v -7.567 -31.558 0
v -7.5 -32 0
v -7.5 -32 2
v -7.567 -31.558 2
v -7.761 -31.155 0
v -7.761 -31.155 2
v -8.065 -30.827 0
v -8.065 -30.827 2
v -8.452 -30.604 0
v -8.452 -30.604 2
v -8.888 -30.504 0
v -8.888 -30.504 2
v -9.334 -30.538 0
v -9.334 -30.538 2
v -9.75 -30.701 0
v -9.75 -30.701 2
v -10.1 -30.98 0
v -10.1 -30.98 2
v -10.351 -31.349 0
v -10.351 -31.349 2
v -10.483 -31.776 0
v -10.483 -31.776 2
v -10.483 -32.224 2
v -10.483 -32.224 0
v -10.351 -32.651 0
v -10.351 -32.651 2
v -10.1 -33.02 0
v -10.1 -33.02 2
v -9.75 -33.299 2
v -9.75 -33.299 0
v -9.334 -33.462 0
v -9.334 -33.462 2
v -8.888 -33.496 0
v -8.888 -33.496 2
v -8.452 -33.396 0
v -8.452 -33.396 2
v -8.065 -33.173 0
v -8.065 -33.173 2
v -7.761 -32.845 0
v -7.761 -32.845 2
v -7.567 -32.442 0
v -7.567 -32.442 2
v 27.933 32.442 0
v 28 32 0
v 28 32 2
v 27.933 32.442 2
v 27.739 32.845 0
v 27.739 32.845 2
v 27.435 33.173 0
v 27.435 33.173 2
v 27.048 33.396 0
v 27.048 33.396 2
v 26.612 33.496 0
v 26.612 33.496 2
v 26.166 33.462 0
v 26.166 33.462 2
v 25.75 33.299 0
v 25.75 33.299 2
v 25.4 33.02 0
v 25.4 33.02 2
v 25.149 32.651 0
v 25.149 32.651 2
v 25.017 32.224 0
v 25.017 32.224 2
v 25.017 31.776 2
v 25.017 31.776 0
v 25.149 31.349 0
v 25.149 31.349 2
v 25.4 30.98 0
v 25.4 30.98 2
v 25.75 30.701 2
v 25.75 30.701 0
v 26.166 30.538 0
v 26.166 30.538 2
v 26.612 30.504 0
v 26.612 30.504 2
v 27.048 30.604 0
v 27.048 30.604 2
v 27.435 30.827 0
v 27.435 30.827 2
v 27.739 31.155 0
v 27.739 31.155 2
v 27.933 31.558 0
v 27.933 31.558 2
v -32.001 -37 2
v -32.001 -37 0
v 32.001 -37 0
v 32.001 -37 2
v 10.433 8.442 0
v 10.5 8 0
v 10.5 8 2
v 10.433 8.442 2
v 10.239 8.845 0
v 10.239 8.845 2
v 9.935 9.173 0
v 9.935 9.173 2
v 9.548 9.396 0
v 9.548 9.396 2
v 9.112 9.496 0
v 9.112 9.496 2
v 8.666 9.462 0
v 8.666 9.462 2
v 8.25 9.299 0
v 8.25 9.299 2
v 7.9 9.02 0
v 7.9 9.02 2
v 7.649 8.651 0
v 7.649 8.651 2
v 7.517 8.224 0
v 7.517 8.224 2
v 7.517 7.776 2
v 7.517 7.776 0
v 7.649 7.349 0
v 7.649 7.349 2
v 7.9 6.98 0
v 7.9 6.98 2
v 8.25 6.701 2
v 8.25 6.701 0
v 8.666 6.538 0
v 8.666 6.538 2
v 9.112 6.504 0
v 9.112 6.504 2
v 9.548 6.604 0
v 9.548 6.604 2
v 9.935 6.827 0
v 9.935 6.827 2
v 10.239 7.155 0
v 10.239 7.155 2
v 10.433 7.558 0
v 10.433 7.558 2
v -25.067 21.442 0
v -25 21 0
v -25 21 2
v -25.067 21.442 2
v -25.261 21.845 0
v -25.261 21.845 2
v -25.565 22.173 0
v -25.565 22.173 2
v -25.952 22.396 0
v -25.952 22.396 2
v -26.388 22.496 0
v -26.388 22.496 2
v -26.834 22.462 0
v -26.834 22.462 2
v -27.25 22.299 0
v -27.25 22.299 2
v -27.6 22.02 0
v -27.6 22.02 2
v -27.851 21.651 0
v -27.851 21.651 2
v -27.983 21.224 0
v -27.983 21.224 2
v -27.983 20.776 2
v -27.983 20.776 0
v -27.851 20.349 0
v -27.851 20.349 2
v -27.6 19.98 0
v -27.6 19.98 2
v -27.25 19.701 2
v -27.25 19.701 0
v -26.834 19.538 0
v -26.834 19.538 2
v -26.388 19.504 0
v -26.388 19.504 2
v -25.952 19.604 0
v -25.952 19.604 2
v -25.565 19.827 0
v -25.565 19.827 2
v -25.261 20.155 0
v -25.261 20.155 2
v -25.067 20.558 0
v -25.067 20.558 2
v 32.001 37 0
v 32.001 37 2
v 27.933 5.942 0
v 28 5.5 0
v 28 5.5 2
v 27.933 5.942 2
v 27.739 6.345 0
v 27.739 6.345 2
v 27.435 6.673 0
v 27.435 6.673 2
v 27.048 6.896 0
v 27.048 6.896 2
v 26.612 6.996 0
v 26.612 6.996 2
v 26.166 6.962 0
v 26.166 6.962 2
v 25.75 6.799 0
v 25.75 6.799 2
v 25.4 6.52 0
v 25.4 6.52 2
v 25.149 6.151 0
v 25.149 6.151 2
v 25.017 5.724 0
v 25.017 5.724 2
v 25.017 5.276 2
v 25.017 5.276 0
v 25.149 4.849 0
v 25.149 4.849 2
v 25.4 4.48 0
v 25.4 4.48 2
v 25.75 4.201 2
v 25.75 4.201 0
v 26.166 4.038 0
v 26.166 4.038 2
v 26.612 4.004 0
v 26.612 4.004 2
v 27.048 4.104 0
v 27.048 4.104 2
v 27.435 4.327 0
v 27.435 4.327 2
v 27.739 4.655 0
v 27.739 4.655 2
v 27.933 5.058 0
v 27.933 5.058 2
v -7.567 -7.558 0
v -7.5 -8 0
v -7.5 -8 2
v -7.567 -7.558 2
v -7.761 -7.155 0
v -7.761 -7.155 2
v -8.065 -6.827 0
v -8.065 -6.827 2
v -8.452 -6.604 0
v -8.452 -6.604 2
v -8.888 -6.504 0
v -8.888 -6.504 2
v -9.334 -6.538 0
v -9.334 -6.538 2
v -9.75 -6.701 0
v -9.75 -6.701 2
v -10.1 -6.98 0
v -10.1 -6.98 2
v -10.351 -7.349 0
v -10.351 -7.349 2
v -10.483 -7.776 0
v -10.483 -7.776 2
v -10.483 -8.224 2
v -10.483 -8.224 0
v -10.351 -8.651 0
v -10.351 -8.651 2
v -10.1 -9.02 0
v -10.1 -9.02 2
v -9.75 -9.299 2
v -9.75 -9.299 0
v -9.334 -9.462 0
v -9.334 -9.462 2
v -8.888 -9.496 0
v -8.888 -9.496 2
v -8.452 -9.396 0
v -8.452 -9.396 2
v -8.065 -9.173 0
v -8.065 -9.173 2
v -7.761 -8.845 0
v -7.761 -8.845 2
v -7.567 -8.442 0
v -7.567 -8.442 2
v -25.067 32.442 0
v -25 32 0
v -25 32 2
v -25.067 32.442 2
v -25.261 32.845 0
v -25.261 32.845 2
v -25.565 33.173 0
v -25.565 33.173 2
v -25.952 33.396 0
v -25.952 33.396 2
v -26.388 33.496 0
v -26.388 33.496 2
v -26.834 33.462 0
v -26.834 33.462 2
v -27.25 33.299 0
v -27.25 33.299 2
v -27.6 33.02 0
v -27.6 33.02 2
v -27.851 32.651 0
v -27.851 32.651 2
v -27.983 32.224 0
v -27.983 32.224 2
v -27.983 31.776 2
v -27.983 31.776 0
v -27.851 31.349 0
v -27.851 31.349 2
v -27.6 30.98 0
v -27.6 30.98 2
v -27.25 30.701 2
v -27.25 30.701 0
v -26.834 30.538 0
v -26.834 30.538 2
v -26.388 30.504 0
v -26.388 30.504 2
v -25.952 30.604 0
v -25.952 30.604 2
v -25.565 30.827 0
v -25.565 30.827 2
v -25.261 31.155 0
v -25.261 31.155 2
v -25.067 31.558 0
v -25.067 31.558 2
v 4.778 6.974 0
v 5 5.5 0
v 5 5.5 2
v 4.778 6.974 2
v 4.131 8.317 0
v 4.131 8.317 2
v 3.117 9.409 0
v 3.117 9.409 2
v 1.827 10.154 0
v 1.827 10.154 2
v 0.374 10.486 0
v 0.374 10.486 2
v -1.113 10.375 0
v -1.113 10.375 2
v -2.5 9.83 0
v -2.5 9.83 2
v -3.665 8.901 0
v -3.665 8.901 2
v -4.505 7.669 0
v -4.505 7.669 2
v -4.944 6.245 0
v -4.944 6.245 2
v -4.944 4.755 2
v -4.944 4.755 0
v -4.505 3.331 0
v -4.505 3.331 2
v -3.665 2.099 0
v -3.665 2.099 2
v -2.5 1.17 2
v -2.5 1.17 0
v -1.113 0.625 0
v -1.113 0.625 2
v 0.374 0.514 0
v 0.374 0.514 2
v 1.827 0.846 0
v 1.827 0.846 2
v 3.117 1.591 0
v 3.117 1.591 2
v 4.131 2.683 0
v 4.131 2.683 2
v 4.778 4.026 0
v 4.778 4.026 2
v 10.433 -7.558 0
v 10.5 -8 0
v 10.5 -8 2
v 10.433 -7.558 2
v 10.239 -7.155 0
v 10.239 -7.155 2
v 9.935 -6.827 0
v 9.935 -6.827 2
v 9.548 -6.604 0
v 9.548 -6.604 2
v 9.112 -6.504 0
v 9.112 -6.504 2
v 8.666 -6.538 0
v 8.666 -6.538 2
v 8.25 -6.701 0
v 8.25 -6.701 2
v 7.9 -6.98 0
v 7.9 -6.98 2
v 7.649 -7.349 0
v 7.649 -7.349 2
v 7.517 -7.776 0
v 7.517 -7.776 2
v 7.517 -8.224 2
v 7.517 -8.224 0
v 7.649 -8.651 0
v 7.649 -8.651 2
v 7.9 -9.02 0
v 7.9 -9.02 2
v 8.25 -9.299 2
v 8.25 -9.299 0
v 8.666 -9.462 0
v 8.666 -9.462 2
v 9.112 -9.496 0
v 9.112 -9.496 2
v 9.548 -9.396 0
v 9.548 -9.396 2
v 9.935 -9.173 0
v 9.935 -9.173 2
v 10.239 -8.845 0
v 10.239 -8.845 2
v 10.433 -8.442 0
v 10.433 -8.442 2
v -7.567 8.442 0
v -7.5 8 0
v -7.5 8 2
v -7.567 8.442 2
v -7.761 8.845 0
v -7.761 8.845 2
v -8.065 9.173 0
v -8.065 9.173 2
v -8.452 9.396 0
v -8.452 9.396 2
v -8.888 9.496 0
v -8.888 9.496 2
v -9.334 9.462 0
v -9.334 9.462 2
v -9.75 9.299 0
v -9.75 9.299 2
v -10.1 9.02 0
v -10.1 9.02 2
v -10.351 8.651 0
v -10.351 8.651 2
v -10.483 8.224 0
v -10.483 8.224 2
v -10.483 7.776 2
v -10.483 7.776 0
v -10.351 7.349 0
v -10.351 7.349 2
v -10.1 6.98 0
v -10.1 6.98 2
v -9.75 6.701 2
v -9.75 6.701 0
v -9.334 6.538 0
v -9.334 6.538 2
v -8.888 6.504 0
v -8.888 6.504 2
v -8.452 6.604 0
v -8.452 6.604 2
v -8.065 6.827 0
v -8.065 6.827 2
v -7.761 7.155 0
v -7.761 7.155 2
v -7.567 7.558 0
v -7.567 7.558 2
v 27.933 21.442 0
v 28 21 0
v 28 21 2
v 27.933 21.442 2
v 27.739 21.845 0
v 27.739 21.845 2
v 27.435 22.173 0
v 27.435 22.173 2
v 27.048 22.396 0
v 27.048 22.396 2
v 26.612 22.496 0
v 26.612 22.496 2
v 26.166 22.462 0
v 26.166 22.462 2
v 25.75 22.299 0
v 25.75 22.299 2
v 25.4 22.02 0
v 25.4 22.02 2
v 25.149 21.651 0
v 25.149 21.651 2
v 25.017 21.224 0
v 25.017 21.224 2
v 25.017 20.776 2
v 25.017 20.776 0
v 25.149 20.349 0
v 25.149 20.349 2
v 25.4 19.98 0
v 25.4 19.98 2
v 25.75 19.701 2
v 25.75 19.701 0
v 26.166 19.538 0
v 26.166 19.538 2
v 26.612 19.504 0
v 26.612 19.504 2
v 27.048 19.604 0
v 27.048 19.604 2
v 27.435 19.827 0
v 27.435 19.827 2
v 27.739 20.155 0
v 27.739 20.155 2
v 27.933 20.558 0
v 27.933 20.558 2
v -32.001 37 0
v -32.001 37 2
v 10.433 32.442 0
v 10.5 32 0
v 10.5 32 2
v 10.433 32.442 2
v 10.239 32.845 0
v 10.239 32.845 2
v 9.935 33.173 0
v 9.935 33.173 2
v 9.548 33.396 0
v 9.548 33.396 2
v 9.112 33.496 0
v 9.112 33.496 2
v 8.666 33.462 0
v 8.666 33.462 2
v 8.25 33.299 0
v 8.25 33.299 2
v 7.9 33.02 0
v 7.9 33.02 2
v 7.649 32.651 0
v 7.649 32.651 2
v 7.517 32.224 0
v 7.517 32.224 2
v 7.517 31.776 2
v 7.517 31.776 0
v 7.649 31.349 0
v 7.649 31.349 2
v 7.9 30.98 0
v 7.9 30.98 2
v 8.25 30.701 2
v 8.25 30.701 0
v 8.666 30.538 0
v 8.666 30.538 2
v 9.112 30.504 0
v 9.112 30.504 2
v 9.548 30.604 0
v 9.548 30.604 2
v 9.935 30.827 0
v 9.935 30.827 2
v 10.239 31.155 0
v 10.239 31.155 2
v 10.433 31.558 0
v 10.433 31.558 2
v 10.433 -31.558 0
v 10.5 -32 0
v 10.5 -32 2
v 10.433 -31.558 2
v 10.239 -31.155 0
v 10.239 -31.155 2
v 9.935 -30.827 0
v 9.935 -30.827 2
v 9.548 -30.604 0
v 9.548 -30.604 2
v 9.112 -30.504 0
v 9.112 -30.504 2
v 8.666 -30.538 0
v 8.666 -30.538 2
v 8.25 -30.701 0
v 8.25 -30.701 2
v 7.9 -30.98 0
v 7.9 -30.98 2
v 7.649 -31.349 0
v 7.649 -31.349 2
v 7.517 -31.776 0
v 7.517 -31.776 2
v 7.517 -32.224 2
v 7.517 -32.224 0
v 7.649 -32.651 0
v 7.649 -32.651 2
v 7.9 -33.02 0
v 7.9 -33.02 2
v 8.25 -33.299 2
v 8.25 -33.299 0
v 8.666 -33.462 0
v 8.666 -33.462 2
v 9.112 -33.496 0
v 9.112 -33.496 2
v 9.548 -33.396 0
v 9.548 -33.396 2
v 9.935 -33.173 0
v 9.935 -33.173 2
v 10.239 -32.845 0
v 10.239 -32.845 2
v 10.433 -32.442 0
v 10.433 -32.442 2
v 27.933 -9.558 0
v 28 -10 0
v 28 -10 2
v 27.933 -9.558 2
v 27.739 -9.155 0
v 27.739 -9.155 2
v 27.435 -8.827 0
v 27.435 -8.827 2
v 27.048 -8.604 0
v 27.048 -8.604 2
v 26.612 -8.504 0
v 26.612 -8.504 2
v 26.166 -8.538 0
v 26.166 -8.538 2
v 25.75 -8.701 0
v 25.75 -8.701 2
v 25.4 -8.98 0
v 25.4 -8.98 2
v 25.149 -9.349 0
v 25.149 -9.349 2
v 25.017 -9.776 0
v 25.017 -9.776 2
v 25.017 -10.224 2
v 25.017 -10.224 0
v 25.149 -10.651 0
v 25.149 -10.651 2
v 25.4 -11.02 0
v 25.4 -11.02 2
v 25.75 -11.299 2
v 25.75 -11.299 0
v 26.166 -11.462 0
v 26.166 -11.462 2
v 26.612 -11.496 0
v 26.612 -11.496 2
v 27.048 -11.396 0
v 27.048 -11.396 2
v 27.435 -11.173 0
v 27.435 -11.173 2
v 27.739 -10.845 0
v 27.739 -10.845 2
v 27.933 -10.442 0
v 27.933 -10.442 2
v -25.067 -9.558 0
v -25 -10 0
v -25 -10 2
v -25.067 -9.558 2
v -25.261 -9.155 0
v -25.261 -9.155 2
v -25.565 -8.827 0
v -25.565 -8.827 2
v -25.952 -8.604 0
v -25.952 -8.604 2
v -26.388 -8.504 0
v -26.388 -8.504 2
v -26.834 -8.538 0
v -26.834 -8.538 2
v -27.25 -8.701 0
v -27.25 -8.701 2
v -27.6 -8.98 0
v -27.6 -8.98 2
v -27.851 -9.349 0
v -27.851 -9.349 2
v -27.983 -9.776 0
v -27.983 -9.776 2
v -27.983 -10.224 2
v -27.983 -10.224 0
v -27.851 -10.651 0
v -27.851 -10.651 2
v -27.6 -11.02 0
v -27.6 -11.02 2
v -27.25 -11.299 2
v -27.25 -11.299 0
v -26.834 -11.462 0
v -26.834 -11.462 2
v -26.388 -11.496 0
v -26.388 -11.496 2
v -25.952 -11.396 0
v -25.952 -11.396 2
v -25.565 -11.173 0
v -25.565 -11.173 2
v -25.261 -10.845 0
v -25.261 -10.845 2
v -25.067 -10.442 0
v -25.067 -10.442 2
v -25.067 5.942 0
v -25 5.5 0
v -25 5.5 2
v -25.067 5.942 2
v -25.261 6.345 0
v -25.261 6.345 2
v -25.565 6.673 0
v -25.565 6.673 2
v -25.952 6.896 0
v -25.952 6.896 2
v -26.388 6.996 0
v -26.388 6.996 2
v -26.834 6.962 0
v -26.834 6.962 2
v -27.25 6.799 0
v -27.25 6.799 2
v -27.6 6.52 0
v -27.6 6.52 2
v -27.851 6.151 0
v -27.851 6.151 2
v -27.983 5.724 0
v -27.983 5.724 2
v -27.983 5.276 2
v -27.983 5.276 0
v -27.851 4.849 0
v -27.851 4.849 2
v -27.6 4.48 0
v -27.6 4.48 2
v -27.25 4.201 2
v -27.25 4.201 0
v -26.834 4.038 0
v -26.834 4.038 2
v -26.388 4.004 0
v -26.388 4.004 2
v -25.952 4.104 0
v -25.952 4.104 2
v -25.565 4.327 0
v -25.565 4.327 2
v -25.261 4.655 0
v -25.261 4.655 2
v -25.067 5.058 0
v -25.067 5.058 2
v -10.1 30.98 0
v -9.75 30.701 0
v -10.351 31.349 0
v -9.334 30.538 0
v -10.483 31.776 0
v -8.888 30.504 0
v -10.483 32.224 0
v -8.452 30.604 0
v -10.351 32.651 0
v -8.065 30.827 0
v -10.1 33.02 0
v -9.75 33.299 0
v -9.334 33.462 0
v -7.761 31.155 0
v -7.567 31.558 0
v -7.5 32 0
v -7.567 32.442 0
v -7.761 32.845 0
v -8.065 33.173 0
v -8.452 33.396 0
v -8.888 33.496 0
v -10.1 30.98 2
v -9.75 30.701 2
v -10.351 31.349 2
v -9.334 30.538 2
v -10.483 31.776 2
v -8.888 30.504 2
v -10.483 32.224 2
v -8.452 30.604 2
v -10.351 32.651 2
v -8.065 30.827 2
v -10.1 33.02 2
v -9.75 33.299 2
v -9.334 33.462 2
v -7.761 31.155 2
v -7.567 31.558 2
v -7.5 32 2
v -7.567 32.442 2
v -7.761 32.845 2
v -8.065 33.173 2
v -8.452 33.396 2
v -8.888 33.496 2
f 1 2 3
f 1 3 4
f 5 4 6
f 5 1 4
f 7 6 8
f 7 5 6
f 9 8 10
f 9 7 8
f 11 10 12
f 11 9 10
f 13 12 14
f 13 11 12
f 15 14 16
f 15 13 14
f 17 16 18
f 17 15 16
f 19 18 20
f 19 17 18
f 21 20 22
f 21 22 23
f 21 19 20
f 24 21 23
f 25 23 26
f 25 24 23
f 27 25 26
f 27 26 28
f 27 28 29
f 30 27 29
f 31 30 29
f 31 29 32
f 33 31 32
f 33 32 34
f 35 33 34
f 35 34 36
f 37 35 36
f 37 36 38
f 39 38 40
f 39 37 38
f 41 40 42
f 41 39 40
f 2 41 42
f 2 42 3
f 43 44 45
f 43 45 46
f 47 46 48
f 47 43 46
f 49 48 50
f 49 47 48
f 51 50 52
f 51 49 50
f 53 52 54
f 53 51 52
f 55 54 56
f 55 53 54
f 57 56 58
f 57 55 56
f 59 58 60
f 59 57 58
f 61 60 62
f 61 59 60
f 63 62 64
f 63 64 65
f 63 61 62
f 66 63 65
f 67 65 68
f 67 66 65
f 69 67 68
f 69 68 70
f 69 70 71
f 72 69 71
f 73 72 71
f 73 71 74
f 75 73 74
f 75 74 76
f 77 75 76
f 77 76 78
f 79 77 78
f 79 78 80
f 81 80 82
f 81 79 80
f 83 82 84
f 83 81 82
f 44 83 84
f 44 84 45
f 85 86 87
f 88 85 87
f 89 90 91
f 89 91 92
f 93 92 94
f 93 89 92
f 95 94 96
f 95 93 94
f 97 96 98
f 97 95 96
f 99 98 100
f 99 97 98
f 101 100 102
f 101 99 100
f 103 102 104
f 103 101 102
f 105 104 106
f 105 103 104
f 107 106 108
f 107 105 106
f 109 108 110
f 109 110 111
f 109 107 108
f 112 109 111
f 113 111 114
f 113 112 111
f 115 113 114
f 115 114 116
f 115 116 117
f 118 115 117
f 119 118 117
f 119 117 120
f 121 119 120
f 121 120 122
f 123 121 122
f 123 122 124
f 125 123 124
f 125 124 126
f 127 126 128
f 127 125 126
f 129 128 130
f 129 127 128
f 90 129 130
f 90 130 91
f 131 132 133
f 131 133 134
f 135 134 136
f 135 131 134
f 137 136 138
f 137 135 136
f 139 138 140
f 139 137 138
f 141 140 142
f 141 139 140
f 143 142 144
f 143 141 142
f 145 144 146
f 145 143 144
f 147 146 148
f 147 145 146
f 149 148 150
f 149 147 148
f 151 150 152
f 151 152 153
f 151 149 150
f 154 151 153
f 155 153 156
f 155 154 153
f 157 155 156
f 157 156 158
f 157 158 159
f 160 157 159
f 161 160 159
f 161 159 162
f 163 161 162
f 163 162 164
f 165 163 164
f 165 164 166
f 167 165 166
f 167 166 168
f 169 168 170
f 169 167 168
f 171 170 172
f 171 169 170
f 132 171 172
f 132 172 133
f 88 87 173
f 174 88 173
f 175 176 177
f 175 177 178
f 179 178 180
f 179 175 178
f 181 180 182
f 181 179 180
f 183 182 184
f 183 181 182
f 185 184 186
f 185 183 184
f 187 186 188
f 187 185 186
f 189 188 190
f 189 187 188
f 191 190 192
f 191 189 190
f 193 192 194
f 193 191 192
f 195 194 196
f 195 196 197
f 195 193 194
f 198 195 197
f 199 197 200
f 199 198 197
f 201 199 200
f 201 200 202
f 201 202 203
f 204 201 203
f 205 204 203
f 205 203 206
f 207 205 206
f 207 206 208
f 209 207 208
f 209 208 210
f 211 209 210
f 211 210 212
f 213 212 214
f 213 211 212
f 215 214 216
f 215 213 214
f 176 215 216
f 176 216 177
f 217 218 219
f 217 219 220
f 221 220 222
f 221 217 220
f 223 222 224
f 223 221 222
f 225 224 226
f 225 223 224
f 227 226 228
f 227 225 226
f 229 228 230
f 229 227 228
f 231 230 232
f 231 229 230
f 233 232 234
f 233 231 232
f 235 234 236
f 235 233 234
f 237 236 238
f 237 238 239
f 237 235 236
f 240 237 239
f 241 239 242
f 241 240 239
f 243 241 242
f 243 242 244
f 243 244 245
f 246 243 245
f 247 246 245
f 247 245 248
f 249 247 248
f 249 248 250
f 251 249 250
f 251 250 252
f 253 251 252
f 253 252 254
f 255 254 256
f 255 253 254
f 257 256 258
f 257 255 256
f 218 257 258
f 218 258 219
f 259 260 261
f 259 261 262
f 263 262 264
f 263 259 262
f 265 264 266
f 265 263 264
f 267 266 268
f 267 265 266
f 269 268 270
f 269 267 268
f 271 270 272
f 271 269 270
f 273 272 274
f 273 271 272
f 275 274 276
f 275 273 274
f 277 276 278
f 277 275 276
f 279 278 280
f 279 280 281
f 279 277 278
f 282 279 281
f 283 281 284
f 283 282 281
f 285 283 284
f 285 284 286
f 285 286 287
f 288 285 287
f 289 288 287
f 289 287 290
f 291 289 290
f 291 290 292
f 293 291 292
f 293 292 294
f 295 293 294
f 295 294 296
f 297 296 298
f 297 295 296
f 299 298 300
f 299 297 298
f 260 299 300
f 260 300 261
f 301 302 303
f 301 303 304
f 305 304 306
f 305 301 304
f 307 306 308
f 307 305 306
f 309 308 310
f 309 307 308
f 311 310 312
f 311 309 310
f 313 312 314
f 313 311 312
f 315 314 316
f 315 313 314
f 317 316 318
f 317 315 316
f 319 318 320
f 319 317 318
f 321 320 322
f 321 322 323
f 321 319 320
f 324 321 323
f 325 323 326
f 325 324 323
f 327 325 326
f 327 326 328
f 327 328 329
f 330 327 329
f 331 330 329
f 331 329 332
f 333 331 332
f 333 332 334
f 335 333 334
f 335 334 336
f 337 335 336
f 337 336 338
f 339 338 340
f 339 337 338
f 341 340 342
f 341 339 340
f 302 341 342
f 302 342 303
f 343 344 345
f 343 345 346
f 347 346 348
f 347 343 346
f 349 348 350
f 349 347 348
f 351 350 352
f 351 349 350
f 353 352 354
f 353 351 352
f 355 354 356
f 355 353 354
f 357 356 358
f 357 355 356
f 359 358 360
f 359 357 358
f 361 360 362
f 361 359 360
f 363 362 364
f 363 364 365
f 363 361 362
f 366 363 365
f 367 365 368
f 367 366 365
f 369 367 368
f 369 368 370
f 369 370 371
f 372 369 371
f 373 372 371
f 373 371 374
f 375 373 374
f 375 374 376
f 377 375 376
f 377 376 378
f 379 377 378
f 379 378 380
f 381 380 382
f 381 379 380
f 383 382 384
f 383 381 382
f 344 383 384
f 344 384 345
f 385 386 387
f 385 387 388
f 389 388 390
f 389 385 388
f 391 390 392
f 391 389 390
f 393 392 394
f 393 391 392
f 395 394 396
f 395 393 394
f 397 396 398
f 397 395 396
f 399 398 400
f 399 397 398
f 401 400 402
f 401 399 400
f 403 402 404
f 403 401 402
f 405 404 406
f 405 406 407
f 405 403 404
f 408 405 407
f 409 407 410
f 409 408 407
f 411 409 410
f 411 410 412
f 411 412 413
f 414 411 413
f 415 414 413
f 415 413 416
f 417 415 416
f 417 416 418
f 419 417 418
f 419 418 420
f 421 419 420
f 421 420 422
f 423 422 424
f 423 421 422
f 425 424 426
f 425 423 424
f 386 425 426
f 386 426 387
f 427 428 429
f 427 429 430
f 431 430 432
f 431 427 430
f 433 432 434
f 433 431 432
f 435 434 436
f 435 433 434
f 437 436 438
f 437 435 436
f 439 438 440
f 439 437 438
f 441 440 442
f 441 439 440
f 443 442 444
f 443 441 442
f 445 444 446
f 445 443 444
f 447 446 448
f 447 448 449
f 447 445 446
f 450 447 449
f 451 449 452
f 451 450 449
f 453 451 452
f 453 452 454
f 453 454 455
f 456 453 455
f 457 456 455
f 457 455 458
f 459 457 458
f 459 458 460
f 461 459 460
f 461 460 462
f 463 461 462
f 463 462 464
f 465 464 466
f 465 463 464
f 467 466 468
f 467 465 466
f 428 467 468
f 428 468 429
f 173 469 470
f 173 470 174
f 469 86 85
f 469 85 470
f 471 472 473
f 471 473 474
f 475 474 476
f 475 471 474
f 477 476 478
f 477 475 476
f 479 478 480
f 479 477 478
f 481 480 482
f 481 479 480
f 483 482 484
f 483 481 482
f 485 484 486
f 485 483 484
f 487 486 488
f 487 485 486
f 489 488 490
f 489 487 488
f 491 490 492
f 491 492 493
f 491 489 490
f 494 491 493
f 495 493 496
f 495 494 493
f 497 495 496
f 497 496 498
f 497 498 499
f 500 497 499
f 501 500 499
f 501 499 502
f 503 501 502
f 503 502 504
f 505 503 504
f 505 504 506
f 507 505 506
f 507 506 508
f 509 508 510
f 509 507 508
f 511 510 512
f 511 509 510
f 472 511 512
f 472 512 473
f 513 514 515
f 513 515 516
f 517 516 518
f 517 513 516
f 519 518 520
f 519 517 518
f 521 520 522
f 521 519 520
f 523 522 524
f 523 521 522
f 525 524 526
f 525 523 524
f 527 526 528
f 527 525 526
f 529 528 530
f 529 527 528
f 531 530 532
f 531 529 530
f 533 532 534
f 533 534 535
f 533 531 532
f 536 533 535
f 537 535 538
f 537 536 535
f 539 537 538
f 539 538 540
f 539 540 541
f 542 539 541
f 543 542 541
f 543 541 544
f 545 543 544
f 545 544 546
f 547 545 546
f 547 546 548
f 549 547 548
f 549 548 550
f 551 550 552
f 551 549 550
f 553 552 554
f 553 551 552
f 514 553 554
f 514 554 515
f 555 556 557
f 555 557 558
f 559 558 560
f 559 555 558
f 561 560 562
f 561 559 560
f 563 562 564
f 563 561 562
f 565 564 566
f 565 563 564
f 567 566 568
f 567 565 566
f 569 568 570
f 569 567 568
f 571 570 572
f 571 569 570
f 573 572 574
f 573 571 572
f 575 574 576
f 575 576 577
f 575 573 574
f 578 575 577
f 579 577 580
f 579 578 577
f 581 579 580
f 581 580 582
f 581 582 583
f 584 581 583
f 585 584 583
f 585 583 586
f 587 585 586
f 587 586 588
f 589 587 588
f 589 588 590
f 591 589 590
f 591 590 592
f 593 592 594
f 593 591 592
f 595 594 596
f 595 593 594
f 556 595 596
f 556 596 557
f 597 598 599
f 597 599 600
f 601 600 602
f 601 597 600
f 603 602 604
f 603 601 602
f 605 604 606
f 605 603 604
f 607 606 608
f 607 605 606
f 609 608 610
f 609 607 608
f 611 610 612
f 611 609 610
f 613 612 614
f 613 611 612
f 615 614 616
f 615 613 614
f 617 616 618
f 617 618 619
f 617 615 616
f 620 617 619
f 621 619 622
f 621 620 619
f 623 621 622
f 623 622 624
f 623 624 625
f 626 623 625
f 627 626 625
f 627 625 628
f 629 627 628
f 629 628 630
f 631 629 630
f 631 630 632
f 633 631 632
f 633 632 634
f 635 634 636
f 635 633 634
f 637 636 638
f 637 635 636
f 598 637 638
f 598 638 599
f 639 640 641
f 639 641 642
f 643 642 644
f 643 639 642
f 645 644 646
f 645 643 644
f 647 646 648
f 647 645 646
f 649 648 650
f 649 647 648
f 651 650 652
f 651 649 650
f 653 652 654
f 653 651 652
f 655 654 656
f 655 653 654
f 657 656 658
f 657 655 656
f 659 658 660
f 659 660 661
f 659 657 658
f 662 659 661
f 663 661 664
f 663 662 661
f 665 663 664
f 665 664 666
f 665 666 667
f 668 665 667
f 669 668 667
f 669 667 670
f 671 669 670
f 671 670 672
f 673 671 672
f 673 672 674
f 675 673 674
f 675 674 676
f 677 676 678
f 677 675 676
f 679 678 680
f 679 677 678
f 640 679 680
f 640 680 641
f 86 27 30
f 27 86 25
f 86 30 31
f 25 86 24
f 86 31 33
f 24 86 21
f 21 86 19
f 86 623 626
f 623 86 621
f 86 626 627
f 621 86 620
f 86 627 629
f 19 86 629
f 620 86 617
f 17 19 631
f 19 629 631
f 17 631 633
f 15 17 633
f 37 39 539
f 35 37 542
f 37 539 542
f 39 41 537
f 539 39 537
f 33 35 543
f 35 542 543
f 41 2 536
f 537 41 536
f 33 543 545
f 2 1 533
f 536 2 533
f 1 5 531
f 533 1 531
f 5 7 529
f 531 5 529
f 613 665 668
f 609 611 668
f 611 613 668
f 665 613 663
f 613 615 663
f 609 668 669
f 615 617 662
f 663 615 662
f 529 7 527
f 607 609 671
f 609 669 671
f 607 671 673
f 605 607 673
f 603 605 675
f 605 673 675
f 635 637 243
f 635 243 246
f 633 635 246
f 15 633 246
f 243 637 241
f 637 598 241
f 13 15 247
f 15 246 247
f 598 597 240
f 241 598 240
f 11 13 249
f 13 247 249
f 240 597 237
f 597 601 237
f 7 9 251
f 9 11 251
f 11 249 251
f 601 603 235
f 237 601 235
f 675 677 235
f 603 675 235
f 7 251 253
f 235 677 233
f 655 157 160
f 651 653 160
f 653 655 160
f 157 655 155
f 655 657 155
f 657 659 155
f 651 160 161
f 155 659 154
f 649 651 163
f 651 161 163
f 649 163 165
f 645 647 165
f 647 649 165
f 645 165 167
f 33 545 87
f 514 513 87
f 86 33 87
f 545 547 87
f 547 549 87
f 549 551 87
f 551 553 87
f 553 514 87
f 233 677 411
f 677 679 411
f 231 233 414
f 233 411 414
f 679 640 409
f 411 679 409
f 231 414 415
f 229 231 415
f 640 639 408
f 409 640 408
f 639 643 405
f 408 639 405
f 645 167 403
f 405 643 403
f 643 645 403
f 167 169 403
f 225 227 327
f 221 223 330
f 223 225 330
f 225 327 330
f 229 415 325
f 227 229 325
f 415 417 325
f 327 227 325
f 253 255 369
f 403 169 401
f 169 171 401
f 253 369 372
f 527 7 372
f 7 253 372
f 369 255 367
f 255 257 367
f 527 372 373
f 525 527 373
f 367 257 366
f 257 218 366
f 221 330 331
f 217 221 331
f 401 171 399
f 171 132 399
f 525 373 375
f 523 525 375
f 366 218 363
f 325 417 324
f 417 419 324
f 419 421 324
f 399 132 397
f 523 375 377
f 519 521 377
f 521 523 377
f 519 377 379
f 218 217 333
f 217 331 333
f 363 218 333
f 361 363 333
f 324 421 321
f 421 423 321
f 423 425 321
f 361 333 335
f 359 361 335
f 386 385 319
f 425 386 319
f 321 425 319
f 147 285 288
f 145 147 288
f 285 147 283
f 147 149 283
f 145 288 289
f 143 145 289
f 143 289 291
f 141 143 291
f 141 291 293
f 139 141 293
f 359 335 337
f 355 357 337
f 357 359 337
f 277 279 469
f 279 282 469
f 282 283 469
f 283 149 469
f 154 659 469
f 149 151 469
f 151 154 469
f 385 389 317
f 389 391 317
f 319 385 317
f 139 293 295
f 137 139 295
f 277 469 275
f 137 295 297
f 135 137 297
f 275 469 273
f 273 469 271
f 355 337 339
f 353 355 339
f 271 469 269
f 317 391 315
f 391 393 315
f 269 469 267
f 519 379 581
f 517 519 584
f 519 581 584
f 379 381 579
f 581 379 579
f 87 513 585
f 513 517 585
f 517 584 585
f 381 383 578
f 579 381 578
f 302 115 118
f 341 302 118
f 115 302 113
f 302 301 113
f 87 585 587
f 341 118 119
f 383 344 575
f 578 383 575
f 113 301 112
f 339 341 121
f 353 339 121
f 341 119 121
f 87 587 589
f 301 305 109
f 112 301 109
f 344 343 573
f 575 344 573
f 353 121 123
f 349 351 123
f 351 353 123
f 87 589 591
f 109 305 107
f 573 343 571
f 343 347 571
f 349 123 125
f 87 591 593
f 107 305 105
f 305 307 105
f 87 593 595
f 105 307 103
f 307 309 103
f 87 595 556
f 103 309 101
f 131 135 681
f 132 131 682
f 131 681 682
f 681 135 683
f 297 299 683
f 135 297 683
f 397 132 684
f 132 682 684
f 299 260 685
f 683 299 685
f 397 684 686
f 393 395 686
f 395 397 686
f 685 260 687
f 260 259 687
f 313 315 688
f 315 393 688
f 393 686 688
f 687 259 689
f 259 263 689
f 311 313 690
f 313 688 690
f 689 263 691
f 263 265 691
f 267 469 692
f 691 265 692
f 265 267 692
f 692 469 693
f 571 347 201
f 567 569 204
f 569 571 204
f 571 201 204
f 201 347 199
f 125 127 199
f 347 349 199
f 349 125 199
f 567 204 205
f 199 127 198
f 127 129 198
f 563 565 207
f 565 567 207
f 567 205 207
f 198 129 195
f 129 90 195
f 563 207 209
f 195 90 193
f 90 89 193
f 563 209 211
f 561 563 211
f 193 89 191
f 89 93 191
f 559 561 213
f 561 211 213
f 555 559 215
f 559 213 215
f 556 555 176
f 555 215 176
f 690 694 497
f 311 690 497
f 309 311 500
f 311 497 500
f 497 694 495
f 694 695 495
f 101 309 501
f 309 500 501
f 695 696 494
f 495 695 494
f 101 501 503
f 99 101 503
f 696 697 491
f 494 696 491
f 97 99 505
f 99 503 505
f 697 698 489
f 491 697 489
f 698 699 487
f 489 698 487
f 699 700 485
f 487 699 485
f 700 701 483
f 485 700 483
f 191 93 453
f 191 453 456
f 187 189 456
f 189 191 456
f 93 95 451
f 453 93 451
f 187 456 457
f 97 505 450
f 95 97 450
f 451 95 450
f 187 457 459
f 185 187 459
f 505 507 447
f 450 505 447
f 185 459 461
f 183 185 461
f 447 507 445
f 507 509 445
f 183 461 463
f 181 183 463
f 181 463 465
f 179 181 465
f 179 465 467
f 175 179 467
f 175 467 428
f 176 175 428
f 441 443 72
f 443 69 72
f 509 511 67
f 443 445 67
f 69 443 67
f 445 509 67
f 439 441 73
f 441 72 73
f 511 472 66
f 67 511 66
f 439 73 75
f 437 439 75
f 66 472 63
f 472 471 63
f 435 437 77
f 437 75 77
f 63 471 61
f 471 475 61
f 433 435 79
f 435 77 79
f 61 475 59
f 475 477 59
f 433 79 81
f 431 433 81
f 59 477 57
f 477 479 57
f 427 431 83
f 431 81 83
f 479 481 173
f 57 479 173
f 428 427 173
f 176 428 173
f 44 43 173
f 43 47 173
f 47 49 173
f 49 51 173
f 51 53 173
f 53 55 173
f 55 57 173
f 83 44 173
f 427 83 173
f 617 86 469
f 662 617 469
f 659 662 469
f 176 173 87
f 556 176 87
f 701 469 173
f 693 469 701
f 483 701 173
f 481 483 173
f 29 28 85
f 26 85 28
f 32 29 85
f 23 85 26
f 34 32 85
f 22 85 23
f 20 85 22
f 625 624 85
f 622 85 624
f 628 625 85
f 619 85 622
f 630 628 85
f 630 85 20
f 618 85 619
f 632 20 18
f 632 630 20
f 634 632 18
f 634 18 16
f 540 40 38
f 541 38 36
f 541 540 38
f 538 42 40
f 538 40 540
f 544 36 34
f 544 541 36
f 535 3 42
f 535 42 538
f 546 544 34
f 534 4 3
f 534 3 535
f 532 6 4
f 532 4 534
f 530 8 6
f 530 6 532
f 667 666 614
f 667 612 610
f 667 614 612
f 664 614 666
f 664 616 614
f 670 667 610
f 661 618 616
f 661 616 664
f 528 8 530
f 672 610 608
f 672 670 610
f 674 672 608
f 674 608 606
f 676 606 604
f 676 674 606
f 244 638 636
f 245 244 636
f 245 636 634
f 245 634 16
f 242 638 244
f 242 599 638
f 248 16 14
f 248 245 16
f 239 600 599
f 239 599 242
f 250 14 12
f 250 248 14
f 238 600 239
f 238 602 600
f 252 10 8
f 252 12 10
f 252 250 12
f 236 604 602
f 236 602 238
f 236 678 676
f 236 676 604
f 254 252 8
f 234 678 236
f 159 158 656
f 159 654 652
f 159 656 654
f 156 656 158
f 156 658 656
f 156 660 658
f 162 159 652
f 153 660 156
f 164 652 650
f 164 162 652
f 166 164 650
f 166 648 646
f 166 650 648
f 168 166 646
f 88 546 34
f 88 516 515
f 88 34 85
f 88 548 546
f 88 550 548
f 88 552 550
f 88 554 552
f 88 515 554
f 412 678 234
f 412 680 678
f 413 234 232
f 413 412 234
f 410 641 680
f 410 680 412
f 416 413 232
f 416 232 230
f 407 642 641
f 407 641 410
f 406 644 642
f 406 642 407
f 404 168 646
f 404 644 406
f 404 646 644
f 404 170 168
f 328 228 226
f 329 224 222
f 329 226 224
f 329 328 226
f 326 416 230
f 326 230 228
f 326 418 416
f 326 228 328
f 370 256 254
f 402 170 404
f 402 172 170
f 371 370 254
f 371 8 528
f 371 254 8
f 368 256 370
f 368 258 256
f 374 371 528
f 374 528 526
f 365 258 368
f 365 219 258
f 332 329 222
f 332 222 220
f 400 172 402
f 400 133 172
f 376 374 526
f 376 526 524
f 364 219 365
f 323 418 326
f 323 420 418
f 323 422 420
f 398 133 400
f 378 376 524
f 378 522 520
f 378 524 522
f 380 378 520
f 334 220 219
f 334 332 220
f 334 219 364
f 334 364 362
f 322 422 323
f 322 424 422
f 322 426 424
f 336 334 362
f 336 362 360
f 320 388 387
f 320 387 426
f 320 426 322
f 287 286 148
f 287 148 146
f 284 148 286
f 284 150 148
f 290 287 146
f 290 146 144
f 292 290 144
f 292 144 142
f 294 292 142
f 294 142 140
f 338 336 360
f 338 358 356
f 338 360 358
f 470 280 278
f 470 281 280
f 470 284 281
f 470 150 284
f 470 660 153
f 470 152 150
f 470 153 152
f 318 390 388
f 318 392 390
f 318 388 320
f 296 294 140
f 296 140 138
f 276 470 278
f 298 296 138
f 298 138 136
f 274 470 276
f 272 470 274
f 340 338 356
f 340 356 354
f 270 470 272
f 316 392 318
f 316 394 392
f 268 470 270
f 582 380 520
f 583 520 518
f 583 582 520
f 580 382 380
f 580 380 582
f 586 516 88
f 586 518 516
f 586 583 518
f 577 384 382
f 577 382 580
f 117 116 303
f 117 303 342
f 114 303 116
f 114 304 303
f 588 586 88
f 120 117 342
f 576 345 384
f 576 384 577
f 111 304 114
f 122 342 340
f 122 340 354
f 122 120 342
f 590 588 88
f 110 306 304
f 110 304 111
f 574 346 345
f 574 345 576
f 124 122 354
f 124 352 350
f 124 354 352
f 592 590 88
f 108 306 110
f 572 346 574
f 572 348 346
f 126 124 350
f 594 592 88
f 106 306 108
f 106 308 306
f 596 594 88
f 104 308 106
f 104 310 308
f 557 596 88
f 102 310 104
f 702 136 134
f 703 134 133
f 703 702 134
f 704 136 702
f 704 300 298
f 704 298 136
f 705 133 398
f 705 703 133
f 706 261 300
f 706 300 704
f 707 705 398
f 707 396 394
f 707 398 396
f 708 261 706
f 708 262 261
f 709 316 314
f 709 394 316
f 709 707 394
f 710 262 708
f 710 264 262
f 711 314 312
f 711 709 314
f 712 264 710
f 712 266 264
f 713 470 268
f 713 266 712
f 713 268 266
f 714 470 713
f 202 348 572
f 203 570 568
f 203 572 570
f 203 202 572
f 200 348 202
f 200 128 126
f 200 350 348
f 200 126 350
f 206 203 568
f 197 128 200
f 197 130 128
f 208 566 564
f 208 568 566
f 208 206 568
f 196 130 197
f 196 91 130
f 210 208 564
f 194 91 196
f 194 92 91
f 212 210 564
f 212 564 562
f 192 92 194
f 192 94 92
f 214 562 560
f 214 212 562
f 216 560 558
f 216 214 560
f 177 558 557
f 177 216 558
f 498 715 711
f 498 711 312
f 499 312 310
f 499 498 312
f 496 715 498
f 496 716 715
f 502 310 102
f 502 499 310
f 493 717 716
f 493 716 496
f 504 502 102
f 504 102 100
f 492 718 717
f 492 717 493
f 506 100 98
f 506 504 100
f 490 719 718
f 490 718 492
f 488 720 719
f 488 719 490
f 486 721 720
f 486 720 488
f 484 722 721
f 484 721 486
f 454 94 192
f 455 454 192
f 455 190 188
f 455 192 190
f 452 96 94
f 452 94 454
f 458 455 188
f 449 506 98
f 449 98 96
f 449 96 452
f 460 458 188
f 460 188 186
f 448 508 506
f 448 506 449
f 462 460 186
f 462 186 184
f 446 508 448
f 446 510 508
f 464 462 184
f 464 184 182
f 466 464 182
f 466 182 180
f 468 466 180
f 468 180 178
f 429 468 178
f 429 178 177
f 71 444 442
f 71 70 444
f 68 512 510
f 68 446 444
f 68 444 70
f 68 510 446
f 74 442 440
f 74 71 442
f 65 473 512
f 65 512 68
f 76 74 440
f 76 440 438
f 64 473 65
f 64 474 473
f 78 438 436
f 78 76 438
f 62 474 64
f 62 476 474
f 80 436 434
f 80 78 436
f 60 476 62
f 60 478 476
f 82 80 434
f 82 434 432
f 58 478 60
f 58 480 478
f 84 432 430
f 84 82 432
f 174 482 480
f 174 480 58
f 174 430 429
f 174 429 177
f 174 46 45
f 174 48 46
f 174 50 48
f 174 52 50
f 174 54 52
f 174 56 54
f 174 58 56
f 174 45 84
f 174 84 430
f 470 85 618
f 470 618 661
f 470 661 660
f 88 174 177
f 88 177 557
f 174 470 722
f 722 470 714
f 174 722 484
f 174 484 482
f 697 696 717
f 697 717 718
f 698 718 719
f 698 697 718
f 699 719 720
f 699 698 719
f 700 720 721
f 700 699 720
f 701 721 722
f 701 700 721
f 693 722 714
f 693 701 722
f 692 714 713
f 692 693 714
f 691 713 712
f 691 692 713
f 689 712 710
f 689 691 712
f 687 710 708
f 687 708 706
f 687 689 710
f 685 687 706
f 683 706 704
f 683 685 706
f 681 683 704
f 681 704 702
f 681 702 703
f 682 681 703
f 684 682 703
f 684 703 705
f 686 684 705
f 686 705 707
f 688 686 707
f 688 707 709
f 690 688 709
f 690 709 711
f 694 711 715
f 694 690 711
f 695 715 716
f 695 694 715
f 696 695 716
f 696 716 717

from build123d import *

# Parameters (mm, degrees)
SKETCH1_W           = 64.001099834
SKETCH1_H           = 74
SKETCH1_R           = 1.5
SKETCH1_R_2         = 5
BOSS_EXTRUDE1_DEPTH = 2


with BuildPart() as part:
    # Sketch1 → Boss-Extrude1 (new body)
    with BuildSketch(Plane.XY):
        Rectangle(SKETCH1_W, SKETCH1_H)
        with Locations((-9, 8)):
            Circle(SKETCH1_R, mode=Mode.SUBTRACT)
        with Locations((26.5, -10)):
            Circle(SKETCH1_R, mode=Mode.SUBTRACT)
        with Locations((-9, 32)):
            Circle(SKETCH1_R, mode=Mode.SUBTRACT)
        with Locations((-9, -32)):
            Circle(SKETCH1_R, mode=Mode.SUBTRACT)
        with Locations((-9, -8)):
            Circle(SKETCH1_R, mode=Mode.SUBTRACT)
        with Locations((26.5, 5.5)):
            Circle(SKETCH1_R, mode=Mode.SUBTRACT)
        with Locations((26.5, 21)):
            Circle(SKETCH1_R, mode=Mode.SUBTRACT)
        with Locations((26.5, 32)):
            Circle(SKETCH1_R, mode=Mode.SUBTRACT)
        with Locations((9, 32)):
            Circle(SKETCH1_R, mode=Mode.SUBTRACT)
        with Locations((9, 8)):
            Circle(SKETCH1_R, mode=Mode.SUBTRACT)
        with Locations((9, -8)):
            Circle(SKETCH1_R, mode=Mode.SUBTRACT)
        with Locations((9, -32)):
            Circle(SKETCH1_R, mode=Mode.SUBTRACT)
        with Locations((-26.5, -10)):
            Circle(SKETCH1_R, mode=Mode.SUBTRACT)
        with Locations((-26.5, 5.5)):
            Circle(SKETCH1_R, mode=Mode.SUBTRACT)
        with Locations((-26.5, 21)):
            Circle(SKETCH1_R, mode=Mode.SUBTRACT)
        with Locations((-26.5, 32)):
            Circle(SKETCH1_R, mode=Mode.SUBTRACT)
        with Locations((0, 5.5)):
            Circle(SKETCH1_R_2, mode=Mode.SUBTRACT)
    extrude(amount=BOSS_EXTRUDE1_DEPTH)


solid = part.part
